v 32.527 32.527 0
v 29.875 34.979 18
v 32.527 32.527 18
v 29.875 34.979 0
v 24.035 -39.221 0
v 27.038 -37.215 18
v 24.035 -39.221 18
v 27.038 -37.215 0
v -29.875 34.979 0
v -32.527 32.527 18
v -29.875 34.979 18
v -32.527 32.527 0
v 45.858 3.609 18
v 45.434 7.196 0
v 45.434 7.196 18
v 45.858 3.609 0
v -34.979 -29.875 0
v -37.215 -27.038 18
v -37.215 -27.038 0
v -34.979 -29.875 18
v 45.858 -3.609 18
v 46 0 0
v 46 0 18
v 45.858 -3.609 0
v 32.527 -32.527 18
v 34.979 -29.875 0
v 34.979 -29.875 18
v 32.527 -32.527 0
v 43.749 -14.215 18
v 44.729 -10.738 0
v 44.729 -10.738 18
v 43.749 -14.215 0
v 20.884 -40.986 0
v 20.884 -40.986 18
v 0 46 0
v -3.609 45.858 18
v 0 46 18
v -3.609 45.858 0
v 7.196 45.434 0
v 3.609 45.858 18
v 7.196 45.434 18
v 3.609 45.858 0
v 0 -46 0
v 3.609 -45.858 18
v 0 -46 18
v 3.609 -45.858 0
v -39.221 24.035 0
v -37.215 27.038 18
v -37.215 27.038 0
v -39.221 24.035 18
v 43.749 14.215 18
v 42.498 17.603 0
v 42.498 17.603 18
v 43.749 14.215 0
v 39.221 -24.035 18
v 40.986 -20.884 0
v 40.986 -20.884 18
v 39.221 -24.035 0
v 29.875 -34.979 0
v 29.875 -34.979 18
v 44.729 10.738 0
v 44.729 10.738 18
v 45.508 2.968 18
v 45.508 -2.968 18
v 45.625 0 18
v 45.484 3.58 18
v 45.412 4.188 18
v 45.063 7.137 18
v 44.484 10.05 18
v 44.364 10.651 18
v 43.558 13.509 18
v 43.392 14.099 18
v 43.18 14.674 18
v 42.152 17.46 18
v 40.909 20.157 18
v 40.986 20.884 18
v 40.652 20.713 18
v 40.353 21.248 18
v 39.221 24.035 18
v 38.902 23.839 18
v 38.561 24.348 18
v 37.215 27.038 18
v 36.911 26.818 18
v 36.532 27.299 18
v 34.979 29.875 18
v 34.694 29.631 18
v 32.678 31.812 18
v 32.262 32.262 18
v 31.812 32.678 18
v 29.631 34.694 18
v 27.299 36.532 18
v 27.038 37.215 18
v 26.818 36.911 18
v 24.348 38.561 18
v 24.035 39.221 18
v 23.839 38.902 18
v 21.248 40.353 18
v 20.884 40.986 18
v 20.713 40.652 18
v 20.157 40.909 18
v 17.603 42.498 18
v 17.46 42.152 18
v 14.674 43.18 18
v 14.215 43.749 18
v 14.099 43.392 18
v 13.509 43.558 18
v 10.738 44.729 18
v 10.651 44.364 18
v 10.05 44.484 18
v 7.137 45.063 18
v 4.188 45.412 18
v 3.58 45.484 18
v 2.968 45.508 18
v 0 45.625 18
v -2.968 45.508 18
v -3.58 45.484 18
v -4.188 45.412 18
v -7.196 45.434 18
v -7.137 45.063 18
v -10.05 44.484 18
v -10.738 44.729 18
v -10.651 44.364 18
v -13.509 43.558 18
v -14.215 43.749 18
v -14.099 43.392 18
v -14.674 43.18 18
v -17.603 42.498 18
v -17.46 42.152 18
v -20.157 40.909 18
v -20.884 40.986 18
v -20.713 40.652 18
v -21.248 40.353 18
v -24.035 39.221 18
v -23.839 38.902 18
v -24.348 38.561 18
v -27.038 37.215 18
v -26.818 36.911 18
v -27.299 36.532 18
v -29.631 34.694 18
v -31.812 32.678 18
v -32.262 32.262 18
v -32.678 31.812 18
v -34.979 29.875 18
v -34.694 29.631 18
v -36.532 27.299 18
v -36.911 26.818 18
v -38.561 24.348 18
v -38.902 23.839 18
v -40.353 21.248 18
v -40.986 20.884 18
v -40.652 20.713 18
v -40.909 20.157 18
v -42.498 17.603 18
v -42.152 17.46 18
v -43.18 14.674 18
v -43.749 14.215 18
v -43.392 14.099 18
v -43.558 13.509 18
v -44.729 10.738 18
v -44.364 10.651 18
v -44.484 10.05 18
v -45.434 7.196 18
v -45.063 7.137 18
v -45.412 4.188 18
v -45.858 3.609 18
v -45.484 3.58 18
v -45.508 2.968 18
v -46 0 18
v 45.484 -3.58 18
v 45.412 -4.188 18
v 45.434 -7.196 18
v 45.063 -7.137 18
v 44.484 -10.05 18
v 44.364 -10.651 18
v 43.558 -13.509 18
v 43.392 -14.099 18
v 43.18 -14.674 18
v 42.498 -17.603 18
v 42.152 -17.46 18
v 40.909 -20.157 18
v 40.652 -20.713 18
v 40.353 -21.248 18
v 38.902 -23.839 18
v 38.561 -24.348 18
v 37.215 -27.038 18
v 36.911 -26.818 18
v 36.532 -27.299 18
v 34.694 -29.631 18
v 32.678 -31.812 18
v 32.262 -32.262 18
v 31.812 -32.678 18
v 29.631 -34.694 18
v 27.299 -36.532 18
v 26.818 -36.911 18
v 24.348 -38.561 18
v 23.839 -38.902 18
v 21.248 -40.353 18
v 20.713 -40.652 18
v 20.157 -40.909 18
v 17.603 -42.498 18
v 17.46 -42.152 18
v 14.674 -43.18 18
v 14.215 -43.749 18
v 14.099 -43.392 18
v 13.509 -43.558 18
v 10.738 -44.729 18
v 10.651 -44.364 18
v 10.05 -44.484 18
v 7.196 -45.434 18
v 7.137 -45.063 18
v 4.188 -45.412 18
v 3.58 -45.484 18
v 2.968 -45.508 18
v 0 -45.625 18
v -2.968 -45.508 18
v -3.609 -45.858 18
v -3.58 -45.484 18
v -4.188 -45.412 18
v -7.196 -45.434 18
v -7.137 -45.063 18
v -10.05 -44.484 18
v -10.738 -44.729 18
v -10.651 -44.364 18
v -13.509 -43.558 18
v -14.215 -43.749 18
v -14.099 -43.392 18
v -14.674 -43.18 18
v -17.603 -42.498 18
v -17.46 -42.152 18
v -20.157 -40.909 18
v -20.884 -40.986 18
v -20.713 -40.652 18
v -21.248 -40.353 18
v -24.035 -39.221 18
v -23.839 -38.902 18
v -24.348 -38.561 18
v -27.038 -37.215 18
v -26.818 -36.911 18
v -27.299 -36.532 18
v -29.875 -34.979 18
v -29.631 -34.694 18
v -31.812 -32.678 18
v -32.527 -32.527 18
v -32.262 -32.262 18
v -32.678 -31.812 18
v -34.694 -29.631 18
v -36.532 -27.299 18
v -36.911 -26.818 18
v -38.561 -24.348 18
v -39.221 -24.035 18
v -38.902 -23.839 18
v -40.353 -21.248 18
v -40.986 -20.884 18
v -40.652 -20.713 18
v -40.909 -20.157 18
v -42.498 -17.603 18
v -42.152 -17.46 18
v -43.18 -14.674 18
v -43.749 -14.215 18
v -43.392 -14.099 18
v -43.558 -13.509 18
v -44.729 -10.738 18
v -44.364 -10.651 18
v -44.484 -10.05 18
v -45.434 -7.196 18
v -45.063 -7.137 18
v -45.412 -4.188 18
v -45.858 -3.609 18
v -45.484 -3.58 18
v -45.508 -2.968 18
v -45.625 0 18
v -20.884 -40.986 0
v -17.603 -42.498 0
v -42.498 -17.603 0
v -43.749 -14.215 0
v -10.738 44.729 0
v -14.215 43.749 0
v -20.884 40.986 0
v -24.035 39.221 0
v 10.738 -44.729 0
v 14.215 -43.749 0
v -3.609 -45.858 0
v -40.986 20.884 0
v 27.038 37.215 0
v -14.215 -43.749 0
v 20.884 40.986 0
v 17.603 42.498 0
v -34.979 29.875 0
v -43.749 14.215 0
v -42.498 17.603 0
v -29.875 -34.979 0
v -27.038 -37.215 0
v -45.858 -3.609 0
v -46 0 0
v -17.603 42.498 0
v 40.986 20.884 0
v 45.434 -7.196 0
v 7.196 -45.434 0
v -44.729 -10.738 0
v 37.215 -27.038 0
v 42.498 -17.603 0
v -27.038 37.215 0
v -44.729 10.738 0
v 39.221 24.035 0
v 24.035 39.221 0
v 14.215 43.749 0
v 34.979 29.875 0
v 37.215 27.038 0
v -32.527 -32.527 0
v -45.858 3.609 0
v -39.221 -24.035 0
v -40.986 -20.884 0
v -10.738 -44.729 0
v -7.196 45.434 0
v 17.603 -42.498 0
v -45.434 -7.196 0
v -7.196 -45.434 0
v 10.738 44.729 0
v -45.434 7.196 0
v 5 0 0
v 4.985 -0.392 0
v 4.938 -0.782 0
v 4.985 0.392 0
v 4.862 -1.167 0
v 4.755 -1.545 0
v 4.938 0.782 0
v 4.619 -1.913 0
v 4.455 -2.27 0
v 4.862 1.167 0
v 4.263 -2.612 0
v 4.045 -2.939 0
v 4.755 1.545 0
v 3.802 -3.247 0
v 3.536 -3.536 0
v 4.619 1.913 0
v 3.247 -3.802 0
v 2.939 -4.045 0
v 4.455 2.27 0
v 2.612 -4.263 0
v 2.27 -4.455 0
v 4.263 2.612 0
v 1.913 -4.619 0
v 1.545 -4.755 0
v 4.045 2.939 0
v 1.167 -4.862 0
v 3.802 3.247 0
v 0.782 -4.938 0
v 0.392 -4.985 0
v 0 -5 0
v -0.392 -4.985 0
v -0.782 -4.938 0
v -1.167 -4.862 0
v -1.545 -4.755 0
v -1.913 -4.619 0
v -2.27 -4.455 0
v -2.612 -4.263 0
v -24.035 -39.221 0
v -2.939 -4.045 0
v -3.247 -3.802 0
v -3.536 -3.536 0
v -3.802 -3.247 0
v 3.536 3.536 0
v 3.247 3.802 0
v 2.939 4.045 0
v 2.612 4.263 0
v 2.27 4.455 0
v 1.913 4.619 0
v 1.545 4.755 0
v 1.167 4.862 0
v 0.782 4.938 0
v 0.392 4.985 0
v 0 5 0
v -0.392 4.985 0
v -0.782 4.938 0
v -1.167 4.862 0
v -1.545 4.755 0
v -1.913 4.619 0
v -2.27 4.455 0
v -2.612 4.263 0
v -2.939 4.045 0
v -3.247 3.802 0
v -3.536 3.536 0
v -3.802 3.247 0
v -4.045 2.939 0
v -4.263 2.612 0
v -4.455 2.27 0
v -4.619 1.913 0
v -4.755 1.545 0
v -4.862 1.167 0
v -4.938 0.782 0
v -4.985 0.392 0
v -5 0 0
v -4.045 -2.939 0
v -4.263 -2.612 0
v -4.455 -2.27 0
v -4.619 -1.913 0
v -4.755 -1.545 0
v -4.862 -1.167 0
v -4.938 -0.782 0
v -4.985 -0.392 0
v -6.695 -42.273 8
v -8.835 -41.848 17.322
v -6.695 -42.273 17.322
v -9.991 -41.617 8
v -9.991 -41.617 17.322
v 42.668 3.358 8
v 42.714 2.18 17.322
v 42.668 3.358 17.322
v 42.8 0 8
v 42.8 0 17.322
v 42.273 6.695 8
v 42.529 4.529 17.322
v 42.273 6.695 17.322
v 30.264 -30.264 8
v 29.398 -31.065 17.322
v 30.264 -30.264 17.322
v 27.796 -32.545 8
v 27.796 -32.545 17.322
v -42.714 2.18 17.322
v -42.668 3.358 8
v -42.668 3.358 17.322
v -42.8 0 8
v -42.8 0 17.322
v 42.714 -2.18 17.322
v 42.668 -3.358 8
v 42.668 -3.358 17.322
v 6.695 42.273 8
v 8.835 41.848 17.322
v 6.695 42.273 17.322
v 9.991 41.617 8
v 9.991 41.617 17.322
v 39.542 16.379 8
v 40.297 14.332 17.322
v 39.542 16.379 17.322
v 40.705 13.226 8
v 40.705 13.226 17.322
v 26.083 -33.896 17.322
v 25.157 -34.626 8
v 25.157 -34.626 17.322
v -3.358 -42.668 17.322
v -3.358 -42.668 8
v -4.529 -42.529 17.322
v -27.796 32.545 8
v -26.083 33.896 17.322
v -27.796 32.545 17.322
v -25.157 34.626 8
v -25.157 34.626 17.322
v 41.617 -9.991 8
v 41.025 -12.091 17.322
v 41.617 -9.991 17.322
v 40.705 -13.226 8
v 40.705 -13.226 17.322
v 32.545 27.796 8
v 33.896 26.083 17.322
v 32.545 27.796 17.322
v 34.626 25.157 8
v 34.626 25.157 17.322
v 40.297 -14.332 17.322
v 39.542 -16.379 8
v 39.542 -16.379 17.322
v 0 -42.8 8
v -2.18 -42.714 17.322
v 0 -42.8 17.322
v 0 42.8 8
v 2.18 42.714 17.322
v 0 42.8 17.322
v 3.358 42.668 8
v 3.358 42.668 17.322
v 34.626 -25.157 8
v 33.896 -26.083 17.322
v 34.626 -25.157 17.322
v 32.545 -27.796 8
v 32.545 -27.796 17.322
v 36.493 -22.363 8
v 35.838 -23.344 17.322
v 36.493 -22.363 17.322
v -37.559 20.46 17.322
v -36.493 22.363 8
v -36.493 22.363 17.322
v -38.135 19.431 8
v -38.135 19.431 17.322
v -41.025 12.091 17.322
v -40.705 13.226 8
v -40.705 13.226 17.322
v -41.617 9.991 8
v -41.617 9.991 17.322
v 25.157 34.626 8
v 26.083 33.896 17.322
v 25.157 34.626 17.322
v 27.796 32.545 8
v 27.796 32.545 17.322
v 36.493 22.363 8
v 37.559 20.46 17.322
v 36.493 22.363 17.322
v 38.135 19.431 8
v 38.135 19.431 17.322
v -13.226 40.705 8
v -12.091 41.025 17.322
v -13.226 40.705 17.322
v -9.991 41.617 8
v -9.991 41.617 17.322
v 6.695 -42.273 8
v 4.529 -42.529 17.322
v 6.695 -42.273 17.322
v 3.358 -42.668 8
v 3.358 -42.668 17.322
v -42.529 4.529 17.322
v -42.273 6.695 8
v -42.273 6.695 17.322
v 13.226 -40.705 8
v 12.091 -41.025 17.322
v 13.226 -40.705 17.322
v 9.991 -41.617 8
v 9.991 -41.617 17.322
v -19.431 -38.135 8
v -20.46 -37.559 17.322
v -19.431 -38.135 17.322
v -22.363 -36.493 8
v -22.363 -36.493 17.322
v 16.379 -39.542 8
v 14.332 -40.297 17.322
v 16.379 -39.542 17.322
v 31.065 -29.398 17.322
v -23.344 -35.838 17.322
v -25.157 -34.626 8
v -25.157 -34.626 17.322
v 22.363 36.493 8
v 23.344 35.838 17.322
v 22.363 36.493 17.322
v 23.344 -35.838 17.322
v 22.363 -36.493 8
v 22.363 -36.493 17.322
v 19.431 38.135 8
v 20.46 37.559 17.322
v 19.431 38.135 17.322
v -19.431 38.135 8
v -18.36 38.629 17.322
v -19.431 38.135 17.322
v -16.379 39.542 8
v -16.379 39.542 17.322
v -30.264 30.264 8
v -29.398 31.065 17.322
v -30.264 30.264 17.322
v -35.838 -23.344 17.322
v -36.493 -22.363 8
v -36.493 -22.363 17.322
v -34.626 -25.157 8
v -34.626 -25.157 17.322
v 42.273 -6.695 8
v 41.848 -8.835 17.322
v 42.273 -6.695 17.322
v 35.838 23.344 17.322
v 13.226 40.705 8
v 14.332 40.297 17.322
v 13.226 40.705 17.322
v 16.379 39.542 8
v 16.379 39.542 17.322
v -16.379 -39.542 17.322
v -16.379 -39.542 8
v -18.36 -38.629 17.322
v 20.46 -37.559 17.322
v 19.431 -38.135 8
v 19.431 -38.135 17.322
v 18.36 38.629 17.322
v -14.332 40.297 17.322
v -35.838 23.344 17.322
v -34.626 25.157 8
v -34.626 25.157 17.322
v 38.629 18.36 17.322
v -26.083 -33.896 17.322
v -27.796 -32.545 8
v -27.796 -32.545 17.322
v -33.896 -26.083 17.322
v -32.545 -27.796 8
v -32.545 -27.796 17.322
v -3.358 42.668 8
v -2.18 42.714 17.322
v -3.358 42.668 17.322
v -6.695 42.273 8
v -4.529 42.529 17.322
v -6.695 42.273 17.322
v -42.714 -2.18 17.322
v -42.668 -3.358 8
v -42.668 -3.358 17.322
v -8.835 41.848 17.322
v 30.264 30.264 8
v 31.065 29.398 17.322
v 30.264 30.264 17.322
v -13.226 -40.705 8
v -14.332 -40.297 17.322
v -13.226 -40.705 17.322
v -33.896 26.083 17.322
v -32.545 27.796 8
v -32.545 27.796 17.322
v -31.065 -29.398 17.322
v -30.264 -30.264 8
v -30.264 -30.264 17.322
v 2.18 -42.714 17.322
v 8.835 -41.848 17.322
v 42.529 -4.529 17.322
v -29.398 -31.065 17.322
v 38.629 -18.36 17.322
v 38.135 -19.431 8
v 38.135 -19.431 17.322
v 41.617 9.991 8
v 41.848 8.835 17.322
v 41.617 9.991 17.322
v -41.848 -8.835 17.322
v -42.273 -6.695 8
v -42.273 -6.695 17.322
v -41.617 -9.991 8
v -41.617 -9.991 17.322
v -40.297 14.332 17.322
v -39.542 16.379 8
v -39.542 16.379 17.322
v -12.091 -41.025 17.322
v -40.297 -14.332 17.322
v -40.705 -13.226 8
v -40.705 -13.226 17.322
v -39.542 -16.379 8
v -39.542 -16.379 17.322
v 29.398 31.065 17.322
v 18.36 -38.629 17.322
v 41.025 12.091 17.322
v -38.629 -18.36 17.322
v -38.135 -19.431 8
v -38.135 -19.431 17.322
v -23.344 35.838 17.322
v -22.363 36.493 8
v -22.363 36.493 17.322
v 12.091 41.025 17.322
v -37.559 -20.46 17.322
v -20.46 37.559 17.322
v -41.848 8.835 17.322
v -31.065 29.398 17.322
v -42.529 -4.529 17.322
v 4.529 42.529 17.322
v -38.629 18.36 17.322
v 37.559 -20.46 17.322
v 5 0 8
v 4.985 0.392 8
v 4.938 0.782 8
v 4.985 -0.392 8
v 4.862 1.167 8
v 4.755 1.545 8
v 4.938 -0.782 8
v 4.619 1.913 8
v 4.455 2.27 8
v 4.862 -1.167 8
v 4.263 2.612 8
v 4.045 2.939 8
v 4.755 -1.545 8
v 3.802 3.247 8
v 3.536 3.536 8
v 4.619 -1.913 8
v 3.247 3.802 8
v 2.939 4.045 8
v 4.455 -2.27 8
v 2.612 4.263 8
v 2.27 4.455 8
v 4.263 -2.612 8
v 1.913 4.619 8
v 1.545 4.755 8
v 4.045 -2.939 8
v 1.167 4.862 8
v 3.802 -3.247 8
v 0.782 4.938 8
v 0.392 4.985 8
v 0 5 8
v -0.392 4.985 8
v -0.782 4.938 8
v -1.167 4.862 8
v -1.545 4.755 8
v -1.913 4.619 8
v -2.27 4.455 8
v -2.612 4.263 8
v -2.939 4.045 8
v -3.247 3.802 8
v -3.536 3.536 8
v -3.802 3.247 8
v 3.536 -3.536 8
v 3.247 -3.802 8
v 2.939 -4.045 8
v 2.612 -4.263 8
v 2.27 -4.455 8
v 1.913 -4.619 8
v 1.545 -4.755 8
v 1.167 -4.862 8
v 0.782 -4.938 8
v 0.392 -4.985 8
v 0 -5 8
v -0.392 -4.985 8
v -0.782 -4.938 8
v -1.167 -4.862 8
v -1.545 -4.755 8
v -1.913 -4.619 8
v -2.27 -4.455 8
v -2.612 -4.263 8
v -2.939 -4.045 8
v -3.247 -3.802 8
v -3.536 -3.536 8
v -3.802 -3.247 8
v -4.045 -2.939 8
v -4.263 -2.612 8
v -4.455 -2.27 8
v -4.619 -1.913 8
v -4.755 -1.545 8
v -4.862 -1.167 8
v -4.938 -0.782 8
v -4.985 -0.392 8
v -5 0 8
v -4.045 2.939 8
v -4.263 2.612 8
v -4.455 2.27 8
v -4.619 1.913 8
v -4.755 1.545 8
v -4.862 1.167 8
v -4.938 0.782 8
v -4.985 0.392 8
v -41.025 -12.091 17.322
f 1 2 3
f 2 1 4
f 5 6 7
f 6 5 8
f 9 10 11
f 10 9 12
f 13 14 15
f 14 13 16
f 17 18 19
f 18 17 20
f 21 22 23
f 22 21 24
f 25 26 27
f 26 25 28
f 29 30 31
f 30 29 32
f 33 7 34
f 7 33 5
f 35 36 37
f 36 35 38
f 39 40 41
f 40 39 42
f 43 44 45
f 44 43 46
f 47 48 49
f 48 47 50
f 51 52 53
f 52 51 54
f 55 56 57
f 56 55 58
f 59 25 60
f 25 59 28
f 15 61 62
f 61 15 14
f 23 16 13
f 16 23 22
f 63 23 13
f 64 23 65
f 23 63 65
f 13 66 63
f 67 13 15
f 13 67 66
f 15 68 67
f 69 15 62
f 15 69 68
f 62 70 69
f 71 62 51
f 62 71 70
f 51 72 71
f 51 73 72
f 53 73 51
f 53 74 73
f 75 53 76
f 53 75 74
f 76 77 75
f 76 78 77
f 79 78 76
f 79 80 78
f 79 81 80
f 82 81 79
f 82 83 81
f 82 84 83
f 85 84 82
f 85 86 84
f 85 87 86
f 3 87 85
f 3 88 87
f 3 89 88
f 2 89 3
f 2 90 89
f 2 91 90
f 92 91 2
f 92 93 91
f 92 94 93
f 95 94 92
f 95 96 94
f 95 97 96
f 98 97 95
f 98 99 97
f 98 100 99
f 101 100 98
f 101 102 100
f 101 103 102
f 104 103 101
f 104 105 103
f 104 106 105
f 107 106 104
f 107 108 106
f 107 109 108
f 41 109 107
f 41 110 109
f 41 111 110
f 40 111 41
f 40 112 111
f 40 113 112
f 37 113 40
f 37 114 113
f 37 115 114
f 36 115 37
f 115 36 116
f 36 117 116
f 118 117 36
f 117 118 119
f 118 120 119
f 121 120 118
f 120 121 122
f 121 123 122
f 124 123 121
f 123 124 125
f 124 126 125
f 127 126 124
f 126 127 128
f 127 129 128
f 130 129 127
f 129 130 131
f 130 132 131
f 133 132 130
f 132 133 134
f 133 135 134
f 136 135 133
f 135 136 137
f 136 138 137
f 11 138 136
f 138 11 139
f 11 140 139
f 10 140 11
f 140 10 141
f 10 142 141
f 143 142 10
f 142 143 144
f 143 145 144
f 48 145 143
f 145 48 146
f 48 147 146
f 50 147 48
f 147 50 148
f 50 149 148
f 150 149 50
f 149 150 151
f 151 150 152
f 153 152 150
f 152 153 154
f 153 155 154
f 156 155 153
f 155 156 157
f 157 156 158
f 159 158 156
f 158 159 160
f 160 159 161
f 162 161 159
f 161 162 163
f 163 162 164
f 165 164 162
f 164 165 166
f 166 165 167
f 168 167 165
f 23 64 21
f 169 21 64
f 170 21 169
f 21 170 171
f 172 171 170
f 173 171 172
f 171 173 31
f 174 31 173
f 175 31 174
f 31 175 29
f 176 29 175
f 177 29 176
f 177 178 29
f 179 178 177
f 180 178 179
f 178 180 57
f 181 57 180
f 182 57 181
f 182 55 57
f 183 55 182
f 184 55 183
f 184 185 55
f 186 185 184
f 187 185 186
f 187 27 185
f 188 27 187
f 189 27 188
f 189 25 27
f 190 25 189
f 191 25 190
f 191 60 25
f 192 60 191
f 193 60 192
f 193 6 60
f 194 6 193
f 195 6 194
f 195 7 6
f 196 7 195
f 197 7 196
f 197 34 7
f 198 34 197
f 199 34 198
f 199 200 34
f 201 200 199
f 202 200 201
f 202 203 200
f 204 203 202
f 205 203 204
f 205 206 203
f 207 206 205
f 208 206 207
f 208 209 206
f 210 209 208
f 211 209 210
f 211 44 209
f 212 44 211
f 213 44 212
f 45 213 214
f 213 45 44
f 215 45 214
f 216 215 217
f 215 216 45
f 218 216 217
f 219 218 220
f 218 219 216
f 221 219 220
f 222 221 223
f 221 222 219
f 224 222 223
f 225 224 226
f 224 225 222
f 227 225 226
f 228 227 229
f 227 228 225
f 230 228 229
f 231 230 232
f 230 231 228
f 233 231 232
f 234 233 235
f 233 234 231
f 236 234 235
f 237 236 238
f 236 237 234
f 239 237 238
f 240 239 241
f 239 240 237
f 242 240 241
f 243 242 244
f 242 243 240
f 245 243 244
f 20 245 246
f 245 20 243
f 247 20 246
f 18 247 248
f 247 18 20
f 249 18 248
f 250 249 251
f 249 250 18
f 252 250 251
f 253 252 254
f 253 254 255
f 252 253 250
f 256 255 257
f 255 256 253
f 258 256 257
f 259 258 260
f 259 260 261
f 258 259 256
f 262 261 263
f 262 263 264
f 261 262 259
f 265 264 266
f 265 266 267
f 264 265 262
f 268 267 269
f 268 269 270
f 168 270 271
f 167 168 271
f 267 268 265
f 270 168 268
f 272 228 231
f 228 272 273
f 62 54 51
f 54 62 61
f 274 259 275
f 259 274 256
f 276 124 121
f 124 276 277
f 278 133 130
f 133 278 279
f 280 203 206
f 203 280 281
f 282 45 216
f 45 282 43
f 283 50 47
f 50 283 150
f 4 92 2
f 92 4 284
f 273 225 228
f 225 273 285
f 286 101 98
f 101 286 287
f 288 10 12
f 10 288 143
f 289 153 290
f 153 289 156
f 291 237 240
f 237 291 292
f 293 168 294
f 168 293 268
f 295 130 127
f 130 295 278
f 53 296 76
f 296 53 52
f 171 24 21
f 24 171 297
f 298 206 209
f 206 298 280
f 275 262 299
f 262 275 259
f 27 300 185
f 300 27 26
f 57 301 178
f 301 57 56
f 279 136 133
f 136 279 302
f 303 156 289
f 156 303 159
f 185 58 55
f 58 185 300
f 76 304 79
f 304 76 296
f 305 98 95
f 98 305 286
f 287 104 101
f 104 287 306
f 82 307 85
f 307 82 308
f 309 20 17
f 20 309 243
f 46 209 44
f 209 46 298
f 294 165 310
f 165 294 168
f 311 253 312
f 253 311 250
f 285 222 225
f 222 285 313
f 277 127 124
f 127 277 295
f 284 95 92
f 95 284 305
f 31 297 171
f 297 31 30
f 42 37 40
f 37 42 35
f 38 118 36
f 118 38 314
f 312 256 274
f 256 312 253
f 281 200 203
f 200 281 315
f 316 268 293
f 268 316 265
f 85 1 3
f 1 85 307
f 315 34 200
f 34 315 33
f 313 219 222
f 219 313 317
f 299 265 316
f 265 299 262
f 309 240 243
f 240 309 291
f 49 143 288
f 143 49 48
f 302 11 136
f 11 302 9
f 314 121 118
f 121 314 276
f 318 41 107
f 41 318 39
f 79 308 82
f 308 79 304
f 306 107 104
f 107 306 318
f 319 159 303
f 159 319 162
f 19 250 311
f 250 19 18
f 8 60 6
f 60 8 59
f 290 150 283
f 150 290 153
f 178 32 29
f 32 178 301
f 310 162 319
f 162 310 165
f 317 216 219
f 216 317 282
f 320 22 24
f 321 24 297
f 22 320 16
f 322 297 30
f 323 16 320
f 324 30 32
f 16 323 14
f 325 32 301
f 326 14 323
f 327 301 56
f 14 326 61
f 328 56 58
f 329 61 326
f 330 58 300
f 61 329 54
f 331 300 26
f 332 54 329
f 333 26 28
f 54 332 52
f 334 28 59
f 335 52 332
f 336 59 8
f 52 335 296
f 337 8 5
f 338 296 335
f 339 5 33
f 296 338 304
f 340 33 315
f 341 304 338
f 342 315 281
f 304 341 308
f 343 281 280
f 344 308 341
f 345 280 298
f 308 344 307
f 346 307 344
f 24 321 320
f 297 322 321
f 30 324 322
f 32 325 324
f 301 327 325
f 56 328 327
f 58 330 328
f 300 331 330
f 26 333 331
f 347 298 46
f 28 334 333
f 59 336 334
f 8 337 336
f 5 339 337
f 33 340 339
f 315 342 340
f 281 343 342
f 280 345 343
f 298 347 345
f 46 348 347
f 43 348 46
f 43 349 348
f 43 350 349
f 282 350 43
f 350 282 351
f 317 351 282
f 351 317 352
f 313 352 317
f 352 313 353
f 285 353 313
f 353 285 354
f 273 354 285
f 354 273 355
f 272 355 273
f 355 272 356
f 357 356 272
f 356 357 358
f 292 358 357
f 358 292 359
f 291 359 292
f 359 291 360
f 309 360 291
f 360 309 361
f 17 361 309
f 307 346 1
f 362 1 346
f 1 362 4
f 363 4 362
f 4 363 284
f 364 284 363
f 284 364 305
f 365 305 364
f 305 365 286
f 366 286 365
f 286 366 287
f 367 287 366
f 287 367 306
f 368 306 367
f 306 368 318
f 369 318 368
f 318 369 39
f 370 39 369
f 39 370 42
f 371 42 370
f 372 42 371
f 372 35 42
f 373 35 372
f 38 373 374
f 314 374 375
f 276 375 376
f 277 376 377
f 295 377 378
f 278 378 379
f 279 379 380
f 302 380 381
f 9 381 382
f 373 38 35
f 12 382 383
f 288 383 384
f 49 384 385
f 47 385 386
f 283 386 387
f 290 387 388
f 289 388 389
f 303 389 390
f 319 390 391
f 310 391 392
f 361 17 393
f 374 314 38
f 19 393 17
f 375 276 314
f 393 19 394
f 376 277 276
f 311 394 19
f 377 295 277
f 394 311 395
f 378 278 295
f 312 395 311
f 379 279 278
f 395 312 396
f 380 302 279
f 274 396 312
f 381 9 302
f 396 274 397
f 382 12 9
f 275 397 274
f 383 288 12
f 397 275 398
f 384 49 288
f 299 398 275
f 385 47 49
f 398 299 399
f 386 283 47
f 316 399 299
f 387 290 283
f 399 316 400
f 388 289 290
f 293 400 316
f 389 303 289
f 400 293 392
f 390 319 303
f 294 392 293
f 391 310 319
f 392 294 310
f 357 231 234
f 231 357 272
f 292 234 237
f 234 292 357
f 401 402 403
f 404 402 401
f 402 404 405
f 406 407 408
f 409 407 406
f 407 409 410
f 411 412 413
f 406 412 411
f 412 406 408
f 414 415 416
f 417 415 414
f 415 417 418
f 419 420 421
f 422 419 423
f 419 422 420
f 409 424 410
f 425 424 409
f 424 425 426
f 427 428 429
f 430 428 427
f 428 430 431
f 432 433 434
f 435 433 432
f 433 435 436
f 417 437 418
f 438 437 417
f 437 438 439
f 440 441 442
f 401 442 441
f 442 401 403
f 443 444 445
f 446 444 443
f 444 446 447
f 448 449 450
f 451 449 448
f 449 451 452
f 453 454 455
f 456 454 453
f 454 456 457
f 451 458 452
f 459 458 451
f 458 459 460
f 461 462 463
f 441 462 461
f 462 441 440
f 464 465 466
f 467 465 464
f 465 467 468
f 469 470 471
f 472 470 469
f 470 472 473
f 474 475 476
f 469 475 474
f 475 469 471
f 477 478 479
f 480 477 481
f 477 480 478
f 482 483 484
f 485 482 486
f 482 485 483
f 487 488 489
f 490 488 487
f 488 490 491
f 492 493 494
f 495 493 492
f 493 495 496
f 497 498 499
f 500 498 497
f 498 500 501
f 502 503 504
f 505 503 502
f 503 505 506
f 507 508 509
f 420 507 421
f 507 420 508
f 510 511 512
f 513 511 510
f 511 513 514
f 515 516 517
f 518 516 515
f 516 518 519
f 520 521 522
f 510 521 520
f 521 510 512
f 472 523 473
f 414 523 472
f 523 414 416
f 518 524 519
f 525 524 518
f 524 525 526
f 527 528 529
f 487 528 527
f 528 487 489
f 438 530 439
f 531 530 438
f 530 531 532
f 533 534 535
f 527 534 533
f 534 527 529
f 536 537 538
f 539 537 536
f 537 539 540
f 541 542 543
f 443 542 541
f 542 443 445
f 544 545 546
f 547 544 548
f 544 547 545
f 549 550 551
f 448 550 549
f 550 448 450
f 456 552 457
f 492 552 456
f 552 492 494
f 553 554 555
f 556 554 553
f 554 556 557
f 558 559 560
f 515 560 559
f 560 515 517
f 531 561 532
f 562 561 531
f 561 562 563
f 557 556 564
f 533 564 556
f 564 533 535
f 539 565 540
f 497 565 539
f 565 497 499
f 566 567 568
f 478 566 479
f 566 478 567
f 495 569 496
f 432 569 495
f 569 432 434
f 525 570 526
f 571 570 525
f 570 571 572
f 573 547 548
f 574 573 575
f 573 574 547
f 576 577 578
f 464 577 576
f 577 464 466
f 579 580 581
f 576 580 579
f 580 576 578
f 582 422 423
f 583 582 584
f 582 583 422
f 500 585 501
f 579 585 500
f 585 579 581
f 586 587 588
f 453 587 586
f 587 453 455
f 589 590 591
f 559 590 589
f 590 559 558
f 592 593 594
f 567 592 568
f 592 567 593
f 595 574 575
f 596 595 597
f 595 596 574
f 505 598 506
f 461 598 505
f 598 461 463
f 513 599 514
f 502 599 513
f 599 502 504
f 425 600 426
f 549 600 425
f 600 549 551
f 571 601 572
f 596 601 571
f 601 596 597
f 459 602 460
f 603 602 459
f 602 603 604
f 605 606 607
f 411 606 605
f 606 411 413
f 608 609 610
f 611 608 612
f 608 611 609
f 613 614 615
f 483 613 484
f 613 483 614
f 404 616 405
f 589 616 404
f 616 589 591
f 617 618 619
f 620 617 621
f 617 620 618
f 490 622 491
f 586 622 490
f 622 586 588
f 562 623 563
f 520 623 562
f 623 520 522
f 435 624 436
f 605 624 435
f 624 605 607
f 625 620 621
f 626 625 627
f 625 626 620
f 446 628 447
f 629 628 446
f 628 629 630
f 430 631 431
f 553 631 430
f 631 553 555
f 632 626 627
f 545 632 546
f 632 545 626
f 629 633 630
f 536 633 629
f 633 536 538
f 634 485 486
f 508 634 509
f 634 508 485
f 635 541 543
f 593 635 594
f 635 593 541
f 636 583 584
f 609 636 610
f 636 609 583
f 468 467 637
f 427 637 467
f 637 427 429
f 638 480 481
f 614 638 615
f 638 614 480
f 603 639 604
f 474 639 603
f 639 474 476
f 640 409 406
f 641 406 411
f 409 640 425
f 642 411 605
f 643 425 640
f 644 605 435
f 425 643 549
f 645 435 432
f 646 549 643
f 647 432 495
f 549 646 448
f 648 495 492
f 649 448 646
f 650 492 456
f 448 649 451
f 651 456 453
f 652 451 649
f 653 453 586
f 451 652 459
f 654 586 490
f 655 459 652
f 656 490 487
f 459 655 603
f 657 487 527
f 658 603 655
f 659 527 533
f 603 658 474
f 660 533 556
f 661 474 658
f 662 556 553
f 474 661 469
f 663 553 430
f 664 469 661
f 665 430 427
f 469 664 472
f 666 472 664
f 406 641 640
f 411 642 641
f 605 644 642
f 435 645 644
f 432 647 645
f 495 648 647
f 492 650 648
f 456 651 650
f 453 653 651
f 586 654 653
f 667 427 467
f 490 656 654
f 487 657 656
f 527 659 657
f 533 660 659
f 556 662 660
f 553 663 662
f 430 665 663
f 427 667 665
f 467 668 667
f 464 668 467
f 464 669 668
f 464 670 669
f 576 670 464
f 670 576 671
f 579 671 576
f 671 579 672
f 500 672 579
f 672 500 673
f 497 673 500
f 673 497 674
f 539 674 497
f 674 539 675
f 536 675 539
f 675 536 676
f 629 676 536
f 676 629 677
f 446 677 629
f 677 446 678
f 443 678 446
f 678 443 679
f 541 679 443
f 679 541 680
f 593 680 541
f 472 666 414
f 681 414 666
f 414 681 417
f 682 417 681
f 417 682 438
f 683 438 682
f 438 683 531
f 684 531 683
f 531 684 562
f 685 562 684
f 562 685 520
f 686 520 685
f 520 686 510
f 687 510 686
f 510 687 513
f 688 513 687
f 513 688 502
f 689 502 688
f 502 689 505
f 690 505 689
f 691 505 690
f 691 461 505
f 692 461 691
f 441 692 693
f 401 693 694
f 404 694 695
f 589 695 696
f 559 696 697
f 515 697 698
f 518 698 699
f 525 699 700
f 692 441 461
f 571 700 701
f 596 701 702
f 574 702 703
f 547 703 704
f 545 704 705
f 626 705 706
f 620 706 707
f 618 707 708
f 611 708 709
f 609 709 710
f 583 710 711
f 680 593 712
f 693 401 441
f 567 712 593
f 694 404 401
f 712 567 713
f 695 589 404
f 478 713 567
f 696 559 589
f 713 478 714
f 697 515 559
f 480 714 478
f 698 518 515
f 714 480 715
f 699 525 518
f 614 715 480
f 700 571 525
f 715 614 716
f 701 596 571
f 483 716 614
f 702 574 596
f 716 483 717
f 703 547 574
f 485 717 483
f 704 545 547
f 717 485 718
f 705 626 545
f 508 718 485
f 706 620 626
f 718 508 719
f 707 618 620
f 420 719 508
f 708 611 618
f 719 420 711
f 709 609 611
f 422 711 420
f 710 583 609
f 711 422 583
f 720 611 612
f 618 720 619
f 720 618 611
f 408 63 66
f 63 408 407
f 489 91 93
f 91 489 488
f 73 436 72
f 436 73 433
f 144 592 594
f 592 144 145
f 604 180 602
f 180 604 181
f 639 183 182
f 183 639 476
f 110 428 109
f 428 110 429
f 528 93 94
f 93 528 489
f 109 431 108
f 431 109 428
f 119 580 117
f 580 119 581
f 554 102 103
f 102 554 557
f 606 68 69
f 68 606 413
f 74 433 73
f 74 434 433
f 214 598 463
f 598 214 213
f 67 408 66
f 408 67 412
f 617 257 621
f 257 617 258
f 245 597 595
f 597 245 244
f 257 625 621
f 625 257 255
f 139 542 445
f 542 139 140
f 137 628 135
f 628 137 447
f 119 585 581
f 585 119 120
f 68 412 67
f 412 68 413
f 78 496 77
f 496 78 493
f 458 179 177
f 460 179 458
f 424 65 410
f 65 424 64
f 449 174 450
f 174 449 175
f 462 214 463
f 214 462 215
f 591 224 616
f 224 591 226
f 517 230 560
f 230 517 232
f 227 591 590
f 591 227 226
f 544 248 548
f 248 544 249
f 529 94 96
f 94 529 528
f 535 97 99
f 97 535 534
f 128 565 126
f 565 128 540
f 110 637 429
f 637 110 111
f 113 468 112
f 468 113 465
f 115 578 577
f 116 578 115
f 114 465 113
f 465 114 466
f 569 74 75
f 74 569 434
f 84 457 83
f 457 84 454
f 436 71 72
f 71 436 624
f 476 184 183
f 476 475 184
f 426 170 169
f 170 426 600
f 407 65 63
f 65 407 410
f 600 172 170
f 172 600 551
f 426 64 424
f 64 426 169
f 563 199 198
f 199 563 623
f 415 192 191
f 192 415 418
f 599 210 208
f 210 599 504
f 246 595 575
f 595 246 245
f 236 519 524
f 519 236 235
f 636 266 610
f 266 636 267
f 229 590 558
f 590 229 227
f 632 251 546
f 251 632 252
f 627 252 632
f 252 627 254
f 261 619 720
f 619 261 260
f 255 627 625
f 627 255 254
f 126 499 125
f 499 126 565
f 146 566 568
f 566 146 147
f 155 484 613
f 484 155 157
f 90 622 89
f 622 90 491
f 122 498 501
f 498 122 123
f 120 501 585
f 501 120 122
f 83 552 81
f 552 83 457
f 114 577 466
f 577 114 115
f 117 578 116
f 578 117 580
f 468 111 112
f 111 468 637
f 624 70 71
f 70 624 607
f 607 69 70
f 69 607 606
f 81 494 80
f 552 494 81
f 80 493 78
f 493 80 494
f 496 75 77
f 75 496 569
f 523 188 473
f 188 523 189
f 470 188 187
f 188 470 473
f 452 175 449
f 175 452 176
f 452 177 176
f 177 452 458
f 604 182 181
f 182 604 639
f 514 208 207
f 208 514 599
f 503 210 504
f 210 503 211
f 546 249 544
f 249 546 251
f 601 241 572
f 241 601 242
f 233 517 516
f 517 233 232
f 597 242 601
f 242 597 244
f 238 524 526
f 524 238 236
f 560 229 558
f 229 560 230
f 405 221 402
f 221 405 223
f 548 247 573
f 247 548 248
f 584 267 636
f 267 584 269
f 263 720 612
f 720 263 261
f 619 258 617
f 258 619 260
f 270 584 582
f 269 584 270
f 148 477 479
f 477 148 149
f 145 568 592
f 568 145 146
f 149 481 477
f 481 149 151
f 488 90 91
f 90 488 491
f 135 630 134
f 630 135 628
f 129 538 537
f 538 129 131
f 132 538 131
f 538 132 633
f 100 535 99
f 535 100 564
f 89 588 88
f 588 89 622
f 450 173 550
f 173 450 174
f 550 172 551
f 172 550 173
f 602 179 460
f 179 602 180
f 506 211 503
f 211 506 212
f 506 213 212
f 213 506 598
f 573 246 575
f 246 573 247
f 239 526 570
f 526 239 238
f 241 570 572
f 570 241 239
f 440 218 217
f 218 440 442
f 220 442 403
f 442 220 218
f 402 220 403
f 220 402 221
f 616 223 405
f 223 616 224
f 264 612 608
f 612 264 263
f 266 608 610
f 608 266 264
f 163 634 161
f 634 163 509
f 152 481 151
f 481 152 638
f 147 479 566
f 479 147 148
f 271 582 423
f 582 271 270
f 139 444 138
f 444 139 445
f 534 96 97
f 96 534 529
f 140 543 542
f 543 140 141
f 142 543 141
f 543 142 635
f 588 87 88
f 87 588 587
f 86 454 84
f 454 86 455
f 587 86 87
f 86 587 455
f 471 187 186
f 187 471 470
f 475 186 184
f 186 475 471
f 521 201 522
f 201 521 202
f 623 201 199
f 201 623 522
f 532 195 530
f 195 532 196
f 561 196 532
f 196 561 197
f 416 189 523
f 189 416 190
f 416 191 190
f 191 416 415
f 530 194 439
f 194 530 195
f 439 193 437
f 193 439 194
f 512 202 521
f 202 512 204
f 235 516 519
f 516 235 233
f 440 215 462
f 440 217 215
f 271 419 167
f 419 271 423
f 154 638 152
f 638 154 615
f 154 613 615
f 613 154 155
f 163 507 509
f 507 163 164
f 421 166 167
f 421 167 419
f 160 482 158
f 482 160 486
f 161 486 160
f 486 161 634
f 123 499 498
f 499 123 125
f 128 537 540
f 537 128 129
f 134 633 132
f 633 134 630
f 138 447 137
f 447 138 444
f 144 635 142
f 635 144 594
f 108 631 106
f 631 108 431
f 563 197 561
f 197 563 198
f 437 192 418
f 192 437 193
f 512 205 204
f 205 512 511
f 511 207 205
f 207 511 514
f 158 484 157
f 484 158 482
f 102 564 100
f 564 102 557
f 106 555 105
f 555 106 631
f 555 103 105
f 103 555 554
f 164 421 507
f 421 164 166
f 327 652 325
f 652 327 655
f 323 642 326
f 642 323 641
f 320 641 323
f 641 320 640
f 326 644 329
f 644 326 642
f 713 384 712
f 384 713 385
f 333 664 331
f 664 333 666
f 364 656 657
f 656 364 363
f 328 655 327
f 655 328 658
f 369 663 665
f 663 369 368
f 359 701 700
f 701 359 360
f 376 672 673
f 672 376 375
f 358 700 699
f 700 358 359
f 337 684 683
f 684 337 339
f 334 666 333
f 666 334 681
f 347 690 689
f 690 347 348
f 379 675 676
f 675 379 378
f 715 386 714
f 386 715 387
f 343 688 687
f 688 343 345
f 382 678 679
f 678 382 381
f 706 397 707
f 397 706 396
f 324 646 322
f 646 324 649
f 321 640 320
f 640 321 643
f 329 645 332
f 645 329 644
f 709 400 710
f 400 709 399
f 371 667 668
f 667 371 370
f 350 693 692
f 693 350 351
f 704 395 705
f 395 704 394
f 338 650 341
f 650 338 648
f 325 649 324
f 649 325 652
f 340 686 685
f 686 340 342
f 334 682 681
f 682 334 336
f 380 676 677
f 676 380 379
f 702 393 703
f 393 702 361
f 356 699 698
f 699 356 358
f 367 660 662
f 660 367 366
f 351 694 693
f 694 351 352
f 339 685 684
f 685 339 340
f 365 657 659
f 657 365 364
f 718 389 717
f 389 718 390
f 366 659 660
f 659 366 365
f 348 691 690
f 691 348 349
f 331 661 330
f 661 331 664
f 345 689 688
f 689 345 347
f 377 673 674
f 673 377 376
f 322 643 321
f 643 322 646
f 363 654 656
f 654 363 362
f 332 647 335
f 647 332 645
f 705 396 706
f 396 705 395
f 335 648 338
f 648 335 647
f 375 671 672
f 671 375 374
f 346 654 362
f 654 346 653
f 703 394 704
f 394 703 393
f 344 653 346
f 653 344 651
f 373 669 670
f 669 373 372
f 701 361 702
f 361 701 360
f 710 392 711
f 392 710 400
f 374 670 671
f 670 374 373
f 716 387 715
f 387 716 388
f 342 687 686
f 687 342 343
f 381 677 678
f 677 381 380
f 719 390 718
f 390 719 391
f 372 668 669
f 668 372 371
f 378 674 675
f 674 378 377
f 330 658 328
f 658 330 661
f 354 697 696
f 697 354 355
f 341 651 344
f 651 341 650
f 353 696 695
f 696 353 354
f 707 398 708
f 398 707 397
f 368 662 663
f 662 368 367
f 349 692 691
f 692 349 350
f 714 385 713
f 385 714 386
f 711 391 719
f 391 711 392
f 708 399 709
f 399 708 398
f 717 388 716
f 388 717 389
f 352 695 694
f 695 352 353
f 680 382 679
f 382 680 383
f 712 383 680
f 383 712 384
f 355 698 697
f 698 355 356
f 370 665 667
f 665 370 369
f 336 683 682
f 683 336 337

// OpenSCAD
// Cherry Pit Lid v003 - fully concave top, 10mm pit hole
// Sits on standard coffee mug ~85mm outer rim diameter

$fn = 80;

mug_od      = 85;
clearance   = 0.6;
wall        = 3.5;
rim_depth   = 10;
lid_thick   = 8;
pit_hole_d  = 10;

outer_d = mug_od + wall * 2;
outer_r = outer_d / 2;

// Sphere radius that makes the bowl span the full lid diameter
// and dip down by lid_thick - 2mm (leaving 2mm floor at edge)
bowl_depth  = lid_thick - 2;
bowl_r      = (outer_r * outer_r + bowl_depth * bowl_depth) / (2 * bowl_depth);

difference() {
    cylinder(d = outer_d, h = rim_depth + lid_thick);

    // Collar bore
    translate([0, 0, lid_thick])
        cylinder(d = mug_od + clearance, h = rim_depth + 1);

    // Full-width concave bowl — sphere tangent to the outer edge
    translate([0, 0, rim_depth + lid_thick + bowl_r - bowl_depth])
        sphere(r = bowl_r);

    // Pit hole through center
    cylinder(d = pit_hole_d, h = rim_depth + lid_thick + 1);
}
